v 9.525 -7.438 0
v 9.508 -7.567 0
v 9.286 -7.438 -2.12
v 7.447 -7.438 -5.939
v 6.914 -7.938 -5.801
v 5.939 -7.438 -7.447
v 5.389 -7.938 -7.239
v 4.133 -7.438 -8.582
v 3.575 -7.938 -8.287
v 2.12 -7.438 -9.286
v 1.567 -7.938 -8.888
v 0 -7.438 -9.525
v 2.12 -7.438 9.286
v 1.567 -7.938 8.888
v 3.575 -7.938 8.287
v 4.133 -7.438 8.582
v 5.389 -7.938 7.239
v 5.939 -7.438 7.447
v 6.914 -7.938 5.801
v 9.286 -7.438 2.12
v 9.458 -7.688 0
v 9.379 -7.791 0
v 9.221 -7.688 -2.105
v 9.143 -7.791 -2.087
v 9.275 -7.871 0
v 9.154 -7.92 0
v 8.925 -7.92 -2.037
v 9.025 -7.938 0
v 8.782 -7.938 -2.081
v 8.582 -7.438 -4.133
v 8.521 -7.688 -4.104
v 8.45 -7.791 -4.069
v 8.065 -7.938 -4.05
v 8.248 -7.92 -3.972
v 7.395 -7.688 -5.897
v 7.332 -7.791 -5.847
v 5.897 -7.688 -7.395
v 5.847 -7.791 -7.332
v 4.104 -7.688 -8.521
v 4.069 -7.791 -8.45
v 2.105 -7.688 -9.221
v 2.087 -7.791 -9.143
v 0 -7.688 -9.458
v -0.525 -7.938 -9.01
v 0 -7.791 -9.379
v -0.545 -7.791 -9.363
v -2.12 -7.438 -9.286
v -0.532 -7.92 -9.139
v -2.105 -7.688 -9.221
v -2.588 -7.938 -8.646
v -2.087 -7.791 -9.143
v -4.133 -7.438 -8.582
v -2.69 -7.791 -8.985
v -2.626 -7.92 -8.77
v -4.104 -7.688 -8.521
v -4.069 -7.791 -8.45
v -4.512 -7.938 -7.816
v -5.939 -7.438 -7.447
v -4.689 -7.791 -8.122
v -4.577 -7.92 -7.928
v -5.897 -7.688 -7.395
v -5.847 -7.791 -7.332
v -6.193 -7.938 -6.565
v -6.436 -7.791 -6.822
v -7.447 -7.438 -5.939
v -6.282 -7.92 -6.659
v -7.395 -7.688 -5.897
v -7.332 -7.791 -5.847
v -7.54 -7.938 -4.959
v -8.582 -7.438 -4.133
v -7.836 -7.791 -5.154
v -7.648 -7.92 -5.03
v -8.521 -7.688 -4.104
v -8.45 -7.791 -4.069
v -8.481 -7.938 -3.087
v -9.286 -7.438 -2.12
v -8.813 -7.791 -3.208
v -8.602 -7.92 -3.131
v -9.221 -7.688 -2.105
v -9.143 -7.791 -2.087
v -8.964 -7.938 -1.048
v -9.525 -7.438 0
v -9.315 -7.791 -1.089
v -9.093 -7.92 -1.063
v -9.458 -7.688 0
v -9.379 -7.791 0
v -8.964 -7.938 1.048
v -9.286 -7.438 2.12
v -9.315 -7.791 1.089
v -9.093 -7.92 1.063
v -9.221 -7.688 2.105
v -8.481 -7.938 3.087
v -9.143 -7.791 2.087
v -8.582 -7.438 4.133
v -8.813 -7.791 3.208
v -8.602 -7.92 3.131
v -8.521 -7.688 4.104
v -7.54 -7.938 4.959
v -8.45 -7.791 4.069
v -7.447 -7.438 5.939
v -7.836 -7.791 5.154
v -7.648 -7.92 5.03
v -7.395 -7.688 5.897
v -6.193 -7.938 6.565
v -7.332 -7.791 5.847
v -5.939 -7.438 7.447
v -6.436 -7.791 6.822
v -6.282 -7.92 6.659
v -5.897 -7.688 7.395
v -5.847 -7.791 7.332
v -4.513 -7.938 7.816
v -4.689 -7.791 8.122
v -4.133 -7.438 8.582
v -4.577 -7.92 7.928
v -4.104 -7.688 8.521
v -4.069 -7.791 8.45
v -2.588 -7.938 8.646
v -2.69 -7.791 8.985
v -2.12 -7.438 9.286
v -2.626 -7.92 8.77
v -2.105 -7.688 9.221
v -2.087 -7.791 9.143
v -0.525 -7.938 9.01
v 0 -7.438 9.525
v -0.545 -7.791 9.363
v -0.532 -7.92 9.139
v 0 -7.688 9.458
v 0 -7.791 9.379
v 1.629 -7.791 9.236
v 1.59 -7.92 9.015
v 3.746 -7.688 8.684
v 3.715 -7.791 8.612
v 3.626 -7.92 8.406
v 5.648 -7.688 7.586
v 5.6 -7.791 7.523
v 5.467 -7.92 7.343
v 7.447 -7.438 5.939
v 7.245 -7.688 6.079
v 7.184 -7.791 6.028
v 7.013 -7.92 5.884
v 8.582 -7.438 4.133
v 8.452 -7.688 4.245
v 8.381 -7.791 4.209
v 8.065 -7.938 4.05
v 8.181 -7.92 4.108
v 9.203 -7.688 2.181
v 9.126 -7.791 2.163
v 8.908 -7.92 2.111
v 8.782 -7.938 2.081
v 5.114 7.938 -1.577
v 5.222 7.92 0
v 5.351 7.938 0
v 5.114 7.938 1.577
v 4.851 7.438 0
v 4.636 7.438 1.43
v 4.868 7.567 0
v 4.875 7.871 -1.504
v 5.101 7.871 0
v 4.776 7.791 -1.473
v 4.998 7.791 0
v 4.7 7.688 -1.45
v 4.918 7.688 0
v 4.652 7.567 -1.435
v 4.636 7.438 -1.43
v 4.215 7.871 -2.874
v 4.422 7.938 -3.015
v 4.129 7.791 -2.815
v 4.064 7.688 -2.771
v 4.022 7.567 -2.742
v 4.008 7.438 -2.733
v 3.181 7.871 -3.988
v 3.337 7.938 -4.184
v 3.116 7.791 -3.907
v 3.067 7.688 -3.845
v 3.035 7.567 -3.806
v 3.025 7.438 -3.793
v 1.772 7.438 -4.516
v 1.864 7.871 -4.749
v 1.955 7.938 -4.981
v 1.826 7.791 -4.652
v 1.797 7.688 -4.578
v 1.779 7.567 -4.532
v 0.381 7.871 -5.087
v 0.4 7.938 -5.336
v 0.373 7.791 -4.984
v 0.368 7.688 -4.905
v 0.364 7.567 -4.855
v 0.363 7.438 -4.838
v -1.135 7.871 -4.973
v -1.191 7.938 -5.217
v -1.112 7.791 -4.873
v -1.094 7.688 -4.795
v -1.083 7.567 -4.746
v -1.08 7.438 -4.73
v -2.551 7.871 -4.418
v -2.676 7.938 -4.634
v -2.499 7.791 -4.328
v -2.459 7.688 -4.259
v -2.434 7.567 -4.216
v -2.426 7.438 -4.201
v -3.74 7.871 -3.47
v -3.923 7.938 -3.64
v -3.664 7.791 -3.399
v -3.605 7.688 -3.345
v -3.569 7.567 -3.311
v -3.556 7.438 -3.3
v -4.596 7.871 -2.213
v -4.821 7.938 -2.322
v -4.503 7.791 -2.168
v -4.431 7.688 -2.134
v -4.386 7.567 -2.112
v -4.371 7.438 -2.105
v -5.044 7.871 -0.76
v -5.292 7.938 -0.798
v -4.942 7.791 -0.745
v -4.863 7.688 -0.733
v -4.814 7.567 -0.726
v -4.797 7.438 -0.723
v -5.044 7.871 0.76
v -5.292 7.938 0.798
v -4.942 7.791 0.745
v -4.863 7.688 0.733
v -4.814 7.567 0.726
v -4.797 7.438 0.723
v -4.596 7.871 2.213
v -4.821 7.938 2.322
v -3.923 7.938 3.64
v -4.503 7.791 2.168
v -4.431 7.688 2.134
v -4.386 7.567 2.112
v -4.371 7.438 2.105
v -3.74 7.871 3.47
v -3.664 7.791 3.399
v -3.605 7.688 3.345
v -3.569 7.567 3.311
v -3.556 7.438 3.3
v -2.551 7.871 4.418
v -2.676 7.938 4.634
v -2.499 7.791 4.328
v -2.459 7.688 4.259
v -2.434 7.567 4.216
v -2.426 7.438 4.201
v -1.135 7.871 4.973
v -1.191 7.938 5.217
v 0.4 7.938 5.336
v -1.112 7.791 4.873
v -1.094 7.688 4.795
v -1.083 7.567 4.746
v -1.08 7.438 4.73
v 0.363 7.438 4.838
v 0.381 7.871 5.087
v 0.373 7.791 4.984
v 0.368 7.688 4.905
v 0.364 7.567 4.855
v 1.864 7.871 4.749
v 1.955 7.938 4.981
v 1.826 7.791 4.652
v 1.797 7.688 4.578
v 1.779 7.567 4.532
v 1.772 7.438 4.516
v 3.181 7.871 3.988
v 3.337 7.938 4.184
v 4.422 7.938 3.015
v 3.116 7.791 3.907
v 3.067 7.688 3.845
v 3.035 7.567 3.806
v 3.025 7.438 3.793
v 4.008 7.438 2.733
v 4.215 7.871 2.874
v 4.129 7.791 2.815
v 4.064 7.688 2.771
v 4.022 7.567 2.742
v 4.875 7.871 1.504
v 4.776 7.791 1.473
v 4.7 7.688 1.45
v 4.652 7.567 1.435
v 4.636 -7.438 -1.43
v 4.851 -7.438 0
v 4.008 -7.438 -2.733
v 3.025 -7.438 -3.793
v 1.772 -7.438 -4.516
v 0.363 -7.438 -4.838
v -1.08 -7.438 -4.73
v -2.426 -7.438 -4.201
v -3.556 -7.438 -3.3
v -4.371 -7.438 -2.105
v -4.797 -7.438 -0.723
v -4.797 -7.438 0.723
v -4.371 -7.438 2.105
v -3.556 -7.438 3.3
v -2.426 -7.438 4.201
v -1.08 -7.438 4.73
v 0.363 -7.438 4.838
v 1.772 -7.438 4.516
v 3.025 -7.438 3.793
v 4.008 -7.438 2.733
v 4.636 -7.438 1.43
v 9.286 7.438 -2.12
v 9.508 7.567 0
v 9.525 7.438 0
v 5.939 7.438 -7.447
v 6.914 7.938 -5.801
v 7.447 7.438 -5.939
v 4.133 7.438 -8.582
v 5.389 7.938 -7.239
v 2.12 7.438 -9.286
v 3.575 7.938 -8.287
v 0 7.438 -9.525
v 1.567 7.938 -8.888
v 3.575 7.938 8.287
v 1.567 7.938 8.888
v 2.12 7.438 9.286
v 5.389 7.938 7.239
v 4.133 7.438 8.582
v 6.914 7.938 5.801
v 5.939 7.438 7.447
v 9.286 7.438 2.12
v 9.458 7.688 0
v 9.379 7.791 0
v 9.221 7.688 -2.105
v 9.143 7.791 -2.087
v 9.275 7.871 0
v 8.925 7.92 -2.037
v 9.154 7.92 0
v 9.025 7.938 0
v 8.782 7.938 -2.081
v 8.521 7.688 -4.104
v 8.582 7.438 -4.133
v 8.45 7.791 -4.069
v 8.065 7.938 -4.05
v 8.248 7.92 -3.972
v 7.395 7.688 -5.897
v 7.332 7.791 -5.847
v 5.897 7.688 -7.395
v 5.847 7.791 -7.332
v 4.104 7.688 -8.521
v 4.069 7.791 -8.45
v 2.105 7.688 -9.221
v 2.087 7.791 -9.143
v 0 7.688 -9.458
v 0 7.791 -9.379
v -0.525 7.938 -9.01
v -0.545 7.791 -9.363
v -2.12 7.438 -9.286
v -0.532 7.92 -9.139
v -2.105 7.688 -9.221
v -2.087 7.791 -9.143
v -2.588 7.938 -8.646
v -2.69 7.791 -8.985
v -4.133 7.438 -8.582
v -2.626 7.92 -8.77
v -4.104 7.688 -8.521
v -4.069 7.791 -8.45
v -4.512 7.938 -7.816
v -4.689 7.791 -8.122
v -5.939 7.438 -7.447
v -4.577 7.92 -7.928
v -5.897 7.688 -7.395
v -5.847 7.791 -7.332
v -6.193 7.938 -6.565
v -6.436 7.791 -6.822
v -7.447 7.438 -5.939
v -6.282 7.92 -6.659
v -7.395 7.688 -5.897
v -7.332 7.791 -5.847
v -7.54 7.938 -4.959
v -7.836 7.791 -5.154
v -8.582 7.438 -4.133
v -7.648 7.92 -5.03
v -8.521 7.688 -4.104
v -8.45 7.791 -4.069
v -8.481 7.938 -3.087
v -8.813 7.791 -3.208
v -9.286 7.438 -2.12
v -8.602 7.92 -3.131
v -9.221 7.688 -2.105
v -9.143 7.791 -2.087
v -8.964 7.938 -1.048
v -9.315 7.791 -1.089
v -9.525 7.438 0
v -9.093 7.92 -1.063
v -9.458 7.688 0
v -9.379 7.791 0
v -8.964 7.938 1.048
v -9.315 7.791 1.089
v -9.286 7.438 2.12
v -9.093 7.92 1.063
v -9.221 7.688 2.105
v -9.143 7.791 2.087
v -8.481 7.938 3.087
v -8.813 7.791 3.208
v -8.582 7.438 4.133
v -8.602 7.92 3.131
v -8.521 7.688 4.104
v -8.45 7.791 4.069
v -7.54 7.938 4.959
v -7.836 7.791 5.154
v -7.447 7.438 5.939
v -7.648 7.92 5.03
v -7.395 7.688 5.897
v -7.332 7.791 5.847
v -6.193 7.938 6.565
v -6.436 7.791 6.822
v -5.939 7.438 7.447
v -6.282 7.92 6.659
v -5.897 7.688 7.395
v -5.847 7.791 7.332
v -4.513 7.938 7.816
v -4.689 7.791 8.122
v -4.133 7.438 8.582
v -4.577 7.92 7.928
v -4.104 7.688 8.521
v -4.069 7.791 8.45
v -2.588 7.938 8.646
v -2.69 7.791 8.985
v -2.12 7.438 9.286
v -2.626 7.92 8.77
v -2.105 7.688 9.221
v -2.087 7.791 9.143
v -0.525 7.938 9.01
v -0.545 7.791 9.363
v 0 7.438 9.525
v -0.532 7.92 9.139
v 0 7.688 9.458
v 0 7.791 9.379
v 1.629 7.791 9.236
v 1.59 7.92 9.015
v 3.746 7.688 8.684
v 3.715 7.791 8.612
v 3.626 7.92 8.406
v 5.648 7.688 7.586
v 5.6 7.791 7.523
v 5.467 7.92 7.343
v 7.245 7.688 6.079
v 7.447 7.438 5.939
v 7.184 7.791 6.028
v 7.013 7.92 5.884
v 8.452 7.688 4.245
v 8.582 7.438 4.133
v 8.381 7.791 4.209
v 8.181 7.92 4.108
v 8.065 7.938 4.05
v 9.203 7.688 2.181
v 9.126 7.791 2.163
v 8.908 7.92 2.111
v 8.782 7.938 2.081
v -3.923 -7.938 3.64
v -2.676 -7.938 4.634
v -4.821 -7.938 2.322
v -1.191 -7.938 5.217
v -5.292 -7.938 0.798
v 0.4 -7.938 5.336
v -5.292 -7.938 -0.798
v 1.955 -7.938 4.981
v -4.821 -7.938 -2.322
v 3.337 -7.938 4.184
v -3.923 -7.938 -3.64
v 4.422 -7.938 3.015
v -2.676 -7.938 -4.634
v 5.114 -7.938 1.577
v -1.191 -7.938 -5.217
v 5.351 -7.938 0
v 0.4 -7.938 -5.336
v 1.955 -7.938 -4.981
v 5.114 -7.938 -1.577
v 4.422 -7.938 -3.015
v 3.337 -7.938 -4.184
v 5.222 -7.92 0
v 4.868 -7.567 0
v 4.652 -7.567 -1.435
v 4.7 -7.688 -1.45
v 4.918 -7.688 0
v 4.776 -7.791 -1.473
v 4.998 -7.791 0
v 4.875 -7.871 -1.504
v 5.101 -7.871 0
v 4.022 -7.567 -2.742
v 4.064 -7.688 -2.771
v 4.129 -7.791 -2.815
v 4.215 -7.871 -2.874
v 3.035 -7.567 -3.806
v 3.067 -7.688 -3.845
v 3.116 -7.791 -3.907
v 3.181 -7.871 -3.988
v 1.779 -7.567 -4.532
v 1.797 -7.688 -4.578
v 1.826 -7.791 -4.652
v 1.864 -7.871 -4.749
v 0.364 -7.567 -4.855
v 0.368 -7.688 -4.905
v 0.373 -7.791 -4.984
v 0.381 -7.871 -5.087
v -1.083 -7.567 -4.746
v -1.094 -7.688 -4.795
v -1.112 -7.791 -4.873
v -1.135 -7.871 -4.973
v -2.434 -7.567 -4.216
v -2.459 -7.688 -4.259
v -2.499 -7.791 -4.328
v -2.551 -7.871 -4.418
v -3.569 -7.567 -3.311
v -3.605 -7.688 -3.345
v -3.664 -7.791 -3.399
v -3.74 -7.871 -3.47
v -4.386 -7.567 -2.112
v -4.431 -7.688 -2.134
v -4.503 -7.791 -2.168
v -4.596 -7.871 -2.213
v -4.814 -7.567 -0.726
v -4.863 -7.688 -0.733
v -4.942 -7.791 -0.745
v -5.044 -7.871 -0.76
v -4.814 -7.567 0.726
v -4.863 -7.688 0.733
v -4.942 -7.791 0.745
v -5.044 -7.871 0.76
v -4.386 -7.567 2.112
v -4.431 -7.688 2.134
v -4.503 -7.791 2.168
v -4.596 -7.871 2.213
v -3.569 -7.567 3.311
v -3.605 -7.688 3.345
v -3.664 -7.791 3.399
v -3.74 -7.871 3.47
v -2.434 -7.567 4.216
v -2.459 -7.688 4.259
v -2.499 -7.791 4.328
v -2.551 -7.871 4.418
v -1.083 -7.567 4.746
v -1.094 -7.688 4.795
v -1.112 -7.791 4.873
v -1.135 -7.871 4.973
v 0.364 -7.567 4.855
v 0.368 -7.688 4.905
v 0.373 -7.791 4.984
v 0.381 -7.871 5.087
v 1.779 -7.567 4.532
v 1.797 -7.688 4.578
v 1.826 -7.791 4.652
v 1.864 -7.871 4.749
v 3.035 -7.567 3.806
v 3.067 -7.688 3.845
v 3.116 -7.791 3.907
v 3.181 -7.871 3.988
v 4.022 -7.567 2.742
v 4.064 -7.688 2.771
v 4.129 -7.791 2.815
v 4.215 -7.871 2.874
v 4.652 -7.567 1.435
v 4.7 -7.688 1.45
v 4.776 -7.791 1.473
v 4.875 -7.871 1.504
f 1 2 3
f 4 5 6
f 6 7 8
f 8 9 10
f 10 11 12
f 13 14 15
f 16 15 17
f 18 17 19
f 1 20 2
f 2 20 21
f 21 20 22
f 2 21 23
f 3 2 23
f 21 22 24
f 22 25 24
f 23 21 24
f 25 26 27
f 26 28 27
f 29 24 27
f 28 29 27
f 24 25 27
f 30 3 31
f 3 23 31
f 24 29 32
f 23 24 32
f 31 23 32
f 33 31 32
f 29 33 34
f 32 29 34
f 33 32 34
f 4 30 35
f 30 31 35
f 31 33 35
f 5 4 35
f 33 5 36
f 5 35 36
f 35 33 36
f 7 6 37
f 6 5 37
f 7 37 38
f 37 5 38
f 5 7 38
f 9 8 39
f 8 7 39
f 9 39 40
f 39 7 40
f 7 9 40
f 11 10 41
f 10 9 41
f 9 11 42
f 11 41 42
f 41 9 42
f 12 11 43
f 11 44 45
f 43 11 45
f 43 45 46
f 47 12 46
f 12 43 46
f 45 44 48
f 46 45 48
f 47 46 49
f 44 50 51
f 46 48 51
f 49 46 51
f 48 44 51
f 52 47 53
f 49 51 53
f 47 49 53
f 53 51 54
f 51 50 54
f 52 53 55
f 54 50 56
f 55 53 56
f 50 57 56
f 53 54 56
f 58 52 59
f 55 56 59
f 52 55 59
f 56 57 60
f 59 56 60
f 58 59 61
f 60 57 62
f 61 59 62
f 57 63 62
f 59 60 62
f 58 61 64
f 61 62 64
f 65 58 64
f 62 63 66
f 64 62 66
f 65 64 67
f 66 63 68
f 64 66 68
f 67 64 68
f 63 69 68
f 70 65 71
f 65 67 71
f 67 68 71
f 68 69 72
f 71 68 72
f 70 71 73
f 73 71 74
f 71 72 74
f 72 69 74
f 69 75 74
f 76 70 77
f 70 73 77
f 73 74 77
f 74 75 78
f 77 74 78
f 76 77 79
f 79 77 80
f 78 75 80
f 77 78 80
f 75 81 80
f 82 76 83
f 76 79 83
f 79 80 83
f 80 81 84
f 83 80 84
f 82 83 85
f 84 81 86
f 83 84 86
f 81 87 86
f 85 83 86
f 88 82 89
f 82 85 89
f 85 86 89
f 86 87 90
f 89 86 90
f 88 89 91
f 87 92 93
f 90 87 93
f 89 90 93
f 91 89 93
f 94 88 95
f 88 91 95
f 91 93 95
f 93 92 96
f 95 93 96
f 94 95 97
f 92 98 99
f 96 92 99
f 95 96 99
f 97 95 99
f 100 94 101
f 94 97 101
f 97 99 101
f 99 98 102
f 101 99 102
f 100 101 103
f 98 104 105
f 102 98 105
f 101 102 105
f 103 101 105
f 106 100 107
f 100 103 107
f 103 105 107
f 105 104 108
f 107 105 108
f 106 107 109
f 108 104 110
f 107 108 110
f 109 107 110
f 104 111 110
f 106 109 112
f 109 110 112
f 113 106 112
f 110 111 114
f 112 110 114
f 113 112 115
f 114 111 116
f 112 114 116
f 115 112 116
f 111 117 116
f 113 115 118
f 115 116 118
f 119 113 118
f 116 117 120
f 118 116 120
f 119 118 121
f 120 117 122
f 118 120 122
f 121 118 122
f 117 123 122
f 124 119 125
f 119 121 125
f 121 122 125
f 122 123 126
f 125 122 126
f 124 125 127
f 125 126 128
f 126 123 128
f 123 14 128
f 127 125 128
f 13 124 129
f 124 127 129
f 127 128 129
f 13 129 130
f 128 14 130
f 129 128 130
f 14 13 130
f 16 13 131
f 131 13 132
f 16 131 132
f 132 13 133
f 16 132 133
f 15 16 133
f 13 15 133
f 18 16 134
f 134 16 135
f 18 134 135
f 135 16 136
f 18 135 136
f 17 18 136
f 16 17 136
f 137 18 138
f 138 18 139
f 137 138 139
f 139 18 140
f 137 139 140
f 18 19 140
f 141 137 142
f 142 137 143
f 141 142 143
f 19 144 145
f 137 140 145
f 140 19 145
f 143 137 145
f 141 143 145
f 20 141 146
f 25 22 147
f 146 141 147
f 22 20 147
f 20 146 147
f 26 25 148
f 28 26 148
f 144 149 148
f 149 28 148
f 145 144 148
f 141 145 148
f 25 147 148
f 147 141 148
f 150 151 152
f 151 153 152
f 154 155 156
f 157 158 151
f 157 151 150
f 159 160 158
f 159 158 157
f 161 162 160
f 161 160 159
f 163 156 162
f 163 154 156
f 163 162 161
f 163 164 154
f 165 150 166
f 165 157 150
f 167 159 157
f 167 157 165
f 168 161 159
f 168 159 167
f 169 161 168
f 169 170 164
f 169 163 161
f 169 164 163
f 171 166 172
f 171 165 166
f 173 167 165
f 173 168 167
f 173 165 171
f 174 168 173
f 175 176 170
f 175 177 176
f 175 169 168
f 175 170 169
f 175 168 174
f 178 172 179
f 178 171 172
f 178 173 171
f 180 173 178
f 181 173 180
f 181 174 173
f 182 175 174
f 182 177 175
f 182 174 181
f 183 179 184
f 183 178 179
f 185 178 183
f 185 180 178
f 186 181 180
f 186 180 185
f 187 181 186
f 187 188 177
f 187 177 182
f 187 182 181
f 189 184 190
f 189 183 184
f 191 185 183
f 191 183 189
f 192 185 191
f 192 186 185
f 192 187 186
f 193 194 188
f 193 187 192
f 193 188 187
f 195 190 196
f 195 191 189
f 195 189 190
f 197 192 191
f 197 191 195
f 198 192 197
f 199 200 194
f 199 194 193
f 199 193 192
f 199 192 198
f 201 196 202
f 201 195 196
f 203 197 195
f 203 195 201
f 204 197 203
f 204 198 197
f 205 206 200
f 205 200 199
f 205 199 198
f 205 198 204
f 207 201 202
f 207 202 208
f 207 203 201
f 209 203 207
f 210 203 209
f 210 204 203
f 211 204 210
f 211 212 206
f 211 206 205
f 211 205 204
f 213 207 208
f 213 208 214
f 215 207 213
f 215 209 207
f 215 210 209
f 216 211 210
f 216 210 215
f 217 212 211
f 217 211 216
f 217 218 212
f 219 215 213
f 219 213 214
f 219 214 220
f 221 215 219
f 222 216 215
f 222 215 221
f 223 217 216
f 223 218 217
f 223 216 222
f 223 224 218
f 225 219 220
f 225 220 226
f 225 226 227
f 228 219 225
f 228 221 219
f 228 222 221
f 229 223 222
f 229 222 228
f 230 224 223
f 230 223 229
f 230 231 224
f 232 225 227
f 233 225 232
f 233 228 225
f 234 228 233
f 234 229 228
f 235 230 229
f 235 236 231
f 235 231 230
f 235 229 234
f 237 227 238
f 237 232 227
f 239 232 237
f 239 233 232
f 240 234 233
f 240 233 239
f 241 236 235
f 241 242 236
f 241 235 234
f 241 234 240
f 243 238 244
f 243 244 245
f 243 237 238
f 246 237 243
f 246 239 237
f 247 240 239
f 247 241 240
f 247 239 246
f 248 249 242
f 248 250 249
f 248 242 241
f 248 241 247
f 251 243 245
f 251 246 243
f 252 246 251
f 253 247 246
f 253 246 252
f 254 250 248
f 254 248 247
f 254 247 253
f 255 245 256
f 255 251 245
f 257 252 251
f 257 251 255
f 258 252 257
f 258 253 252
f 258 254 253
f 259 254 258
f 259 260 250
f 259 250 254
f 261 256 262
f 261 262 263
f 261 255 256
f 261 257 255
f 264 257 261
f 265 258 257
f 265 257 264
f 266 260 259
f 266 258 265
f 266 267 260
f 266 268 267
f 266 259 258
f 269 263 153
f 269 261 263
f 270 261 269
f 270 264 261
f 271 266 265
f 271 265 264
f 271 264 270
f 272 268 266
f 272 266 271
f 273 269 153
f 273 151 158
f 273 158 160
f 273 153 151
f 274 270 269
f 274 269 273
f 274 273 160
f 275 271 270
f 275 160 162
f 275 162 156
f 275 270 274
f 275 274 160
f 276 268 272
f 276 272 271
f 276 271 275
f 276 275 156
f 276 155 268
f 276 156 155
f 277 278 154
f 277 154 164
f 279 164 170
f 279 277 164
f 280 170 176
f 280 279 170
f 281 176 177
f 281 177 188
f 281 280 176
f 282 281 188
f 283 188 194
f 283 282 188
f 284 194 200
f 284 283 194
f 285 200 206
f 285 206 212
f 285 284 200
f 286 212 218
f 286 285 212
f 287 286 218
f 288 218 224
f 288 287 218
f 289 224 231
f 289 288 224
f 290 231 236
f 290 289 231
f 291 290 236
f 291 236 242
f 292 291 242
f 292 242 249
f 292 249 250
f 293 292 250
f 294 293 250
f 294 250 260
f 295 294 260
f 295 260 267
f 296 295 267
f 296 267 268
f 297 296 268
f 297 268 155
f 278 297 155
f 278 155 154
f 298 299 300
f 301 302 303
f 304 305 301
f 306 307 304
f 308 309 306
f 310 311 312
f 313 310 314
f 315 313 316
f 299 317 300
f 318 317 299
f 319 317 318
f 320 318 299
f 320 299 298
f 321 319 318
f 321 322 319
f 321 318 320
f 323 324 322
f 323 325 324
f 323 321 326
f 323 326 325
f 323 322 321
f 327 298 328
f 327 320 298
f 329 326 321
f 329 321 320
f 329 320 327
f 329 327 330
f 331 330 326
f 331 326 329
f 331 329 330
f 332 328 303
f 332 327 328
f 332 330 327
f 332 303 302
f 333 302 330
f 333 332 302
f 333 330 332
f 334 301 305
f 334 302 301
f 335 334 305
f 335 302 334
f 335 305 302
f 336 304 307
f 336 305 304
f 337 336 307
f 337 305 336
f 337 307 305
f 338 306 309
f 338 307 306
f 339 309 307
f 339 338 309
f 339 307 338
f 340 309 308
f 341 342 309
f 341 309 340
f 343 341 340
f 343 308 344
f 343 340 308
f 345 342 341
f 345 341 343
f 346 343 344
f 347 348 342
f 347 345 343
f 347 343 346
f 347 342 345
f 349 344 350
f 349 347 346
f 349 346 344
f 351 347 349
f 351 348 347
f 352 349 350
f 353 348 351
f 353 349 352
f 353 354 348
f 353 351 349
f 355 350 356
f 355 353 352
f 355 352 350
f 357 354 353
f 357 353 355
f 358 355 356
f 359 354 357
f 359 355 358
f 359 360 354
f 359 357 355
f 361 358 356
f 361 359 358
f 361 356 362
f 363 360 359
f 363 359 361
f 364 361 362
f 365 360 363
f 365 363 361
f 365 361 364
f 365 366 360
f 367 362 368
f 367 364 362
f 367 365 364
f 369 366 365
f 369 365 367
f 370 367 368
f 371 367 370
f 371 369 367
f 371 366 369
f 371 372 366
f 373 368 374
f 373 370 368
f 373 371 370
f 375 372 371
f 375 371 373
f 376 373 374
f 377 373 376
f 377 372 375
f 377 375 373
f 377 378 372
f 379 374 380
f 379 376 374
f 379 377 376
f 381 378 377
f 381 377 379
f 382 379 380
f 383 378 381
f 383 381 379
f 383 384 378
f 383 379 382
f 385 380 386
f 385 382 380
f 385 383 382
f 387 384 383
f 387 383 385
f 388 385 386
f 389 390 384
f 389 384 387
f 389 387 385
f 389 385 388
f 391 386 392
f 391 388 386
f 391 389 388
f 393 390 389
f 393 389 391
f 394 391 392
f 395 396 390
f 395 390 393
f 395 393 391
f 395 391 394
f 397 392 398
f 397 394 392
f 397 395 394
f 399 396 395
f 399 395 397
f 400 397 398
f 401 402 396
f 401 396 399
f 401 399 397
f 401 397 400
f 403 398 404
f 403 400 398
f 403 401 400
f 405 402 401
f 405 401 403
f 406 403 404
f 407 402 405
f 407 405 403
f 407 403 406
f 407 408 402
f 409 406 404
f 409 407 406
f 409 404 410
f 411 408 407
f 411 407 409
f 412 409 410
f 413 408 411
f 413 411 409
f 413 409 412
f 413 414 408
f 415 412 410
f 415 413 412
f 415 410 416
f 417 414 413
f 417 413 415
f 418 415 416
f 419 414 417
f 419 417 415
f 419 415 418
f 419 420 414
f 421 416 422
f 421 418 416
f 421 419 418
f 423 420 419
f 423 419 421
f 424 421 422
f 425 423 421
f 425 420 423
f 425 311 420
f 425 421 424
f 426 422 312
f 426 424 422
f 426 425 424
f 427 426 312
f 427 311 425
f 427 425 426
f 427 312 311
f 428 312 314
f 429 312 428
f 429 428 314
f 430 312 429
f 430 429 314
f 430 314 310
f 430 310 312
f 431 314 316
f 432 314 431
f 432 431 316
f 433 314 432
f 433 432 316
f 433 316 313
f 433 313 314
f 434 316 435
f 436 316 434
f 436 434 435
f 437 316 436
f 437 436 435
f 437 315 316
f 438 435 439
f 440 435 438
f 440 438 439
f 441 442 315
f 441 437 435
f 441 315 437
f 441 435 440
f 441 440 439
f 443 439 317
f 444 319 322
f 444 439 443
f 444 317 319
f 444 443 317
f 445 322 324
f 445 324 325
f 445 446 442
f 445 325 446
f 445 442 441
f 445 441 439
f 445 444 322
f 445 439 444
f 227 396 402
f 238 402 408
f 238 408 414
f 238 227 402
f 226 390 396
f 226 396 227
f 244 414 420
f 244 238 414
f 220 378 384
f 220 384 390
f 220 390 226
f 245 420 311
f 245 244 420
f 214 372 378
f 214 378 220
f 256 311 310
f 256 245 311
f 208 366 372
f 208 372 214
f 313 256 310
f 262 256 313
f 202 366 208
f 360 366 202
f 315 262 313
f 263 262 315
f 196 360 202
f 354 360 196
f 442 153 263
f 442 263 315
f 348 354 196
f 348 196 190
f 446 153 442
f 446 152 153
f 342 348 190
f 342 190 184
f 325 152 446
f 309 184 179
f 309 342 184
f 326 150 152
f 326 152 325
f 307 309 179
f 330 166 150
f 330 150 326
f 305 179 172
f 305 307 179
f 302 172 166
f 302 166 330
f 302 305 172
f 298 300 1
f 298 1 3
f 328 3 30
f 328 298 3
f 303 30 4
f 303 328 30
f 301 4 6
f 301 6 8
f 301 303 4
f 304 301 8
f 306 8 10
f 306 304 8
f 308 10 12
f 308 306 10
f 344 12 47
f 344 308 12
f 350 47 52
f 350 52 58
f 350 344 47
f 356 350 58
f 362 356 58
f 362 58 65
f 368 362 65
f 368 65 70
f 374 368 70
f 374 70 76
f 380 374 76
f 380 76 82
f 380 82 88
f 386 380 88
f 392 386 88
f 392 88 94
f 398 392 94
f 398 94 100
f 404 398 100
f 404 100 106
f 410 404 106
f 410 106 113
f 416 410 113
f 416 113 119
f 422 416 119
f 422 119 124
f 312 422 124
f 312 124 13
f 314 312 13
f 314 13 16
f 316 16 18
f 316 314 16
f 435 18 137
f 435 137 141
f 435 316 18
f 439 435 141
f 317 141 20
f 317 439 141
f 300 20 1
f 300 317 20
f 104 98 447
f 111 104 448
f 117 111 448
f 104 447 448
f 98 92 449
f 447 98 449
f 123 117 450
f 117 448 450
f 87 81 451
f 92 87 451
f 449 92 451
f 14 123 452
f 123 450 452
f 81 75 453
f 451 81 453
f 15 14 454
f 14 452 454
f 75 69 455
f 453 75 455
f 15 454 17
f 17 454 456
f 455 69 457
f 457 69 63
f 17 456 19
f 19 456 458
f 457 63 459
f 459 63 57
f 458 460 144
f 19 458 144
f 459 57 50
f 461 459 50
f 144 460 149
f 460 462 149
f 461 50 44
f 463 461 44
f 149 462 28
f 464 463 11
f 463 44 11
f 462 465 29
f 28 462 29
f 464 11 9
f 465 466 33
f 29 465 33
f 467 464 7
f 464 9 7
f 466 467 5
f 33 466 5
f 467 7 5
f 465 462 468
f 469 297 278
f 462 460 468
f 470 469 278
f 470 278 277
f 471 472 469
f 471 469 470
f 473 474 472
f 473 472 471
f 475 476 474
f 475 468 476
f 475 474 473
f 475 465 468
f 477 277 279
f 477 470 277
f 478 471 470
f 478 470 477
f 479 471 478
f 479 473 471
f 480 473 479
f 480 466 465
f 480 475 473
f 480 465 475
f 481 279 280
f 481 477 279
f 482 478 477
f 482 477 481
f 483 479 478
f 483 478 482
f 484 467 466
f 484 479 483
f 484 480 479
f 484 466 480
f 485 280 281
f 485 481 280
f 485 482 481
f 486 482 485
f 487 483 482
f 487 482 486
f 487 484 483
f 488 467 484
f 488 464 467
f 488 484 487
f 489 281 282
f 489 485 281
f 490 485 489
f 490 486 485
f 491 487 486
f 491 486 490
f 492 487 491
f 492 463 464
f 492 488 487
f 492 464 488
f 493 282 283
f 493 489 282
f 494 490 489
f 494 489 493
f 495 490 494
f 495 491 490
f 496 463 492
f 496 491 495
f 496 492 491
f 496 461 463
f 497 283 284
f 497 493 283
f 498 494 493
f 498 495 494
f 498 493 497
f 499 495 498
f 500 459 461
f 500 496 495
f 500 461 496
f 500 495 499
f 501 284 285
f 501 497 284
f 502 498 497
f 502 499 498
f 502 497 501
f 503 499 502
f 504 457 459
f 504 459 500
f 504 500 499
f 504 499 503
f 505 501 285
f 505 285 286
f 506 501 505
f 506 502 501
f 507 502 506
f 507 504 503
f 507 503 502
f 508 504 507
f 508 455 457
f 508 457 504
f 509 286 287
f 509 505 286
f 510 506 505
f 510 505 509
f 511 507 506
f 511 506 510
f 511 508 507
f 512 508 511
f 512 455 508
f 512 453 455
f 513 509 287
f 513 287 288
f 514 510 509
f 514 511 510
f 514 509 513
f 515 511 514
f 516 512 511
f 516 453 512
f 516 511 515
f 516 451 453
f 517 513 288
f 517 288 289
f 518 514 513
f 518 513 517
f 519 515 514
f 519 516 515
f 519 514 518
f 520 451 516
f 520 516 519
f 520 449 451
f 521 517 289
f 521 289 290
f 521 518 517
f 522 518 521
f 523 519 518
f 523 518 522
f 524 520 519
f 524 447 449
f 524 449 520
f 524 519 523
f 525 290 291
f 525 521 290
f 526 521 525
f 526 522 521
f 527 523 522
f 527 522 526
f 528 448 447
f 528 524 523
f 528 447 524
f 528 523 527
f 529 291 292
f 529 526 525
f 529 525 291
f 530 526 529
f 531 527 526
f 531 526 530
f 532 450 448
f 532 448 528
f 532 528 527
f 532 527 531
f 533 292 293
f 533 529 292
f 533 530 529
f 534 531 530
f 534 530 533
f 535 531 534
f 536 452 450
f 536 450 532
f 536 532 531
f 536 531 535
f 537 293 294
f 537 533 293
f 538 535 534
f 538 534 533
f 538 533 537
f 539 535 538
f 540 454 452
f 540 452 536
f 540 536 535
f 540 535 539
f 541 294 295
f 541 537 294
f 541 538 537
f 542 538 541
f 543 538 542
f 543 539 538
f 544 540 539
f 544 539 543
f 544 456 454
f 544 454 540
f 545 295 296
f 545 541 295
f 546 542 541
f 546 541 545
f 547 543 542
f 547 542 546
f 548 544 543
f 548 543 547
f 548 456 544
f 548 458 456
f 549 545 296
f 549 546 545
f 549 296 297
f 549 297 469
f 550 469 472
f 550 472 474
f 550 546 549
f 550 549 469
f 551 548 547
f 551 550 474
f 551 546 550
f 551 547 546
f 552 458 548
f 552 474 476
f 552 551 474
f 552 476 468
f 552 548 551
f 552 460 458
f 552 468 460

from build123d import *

# Parameters (mm, degrees)
ESQUISSE2_R        = 9.525
ESQUISSE2_R_2      = 4.8514
BOSS_EXTRU_1_DEPTH = 7.9375
CONG_2_R           = 0.5


with BuildPart() as part:
    # Esquisse2 → Boss.-Extru.1 (new body, symmetric)
    with BuildSketch(Plane(origin=(0, 0, 0), x_dir=(1, 0, 0), z_dir=(0, 1, 0))):
        Circle(ESQUISSE2_R)
        Circle(ESQUISSE2_R_2, mode=Mode.SUBTRACT)
    extrude(amount=BOSS_EXTRU_1_DEPTH, both=True)

    # Congé2
    cong_2_edges = [part.edges().sort_by_distance(p)[0] for p in [
        (-9.525, -7.9375, 0),
        (-9.525, 7.9375, 0),
        (-4.8514, -7.9375, 0),
        (-4.8514, 7.9375, 0),
    ]]
    fillet(cong_2_edges, radius=CONG_2_R)


solid = part.part
